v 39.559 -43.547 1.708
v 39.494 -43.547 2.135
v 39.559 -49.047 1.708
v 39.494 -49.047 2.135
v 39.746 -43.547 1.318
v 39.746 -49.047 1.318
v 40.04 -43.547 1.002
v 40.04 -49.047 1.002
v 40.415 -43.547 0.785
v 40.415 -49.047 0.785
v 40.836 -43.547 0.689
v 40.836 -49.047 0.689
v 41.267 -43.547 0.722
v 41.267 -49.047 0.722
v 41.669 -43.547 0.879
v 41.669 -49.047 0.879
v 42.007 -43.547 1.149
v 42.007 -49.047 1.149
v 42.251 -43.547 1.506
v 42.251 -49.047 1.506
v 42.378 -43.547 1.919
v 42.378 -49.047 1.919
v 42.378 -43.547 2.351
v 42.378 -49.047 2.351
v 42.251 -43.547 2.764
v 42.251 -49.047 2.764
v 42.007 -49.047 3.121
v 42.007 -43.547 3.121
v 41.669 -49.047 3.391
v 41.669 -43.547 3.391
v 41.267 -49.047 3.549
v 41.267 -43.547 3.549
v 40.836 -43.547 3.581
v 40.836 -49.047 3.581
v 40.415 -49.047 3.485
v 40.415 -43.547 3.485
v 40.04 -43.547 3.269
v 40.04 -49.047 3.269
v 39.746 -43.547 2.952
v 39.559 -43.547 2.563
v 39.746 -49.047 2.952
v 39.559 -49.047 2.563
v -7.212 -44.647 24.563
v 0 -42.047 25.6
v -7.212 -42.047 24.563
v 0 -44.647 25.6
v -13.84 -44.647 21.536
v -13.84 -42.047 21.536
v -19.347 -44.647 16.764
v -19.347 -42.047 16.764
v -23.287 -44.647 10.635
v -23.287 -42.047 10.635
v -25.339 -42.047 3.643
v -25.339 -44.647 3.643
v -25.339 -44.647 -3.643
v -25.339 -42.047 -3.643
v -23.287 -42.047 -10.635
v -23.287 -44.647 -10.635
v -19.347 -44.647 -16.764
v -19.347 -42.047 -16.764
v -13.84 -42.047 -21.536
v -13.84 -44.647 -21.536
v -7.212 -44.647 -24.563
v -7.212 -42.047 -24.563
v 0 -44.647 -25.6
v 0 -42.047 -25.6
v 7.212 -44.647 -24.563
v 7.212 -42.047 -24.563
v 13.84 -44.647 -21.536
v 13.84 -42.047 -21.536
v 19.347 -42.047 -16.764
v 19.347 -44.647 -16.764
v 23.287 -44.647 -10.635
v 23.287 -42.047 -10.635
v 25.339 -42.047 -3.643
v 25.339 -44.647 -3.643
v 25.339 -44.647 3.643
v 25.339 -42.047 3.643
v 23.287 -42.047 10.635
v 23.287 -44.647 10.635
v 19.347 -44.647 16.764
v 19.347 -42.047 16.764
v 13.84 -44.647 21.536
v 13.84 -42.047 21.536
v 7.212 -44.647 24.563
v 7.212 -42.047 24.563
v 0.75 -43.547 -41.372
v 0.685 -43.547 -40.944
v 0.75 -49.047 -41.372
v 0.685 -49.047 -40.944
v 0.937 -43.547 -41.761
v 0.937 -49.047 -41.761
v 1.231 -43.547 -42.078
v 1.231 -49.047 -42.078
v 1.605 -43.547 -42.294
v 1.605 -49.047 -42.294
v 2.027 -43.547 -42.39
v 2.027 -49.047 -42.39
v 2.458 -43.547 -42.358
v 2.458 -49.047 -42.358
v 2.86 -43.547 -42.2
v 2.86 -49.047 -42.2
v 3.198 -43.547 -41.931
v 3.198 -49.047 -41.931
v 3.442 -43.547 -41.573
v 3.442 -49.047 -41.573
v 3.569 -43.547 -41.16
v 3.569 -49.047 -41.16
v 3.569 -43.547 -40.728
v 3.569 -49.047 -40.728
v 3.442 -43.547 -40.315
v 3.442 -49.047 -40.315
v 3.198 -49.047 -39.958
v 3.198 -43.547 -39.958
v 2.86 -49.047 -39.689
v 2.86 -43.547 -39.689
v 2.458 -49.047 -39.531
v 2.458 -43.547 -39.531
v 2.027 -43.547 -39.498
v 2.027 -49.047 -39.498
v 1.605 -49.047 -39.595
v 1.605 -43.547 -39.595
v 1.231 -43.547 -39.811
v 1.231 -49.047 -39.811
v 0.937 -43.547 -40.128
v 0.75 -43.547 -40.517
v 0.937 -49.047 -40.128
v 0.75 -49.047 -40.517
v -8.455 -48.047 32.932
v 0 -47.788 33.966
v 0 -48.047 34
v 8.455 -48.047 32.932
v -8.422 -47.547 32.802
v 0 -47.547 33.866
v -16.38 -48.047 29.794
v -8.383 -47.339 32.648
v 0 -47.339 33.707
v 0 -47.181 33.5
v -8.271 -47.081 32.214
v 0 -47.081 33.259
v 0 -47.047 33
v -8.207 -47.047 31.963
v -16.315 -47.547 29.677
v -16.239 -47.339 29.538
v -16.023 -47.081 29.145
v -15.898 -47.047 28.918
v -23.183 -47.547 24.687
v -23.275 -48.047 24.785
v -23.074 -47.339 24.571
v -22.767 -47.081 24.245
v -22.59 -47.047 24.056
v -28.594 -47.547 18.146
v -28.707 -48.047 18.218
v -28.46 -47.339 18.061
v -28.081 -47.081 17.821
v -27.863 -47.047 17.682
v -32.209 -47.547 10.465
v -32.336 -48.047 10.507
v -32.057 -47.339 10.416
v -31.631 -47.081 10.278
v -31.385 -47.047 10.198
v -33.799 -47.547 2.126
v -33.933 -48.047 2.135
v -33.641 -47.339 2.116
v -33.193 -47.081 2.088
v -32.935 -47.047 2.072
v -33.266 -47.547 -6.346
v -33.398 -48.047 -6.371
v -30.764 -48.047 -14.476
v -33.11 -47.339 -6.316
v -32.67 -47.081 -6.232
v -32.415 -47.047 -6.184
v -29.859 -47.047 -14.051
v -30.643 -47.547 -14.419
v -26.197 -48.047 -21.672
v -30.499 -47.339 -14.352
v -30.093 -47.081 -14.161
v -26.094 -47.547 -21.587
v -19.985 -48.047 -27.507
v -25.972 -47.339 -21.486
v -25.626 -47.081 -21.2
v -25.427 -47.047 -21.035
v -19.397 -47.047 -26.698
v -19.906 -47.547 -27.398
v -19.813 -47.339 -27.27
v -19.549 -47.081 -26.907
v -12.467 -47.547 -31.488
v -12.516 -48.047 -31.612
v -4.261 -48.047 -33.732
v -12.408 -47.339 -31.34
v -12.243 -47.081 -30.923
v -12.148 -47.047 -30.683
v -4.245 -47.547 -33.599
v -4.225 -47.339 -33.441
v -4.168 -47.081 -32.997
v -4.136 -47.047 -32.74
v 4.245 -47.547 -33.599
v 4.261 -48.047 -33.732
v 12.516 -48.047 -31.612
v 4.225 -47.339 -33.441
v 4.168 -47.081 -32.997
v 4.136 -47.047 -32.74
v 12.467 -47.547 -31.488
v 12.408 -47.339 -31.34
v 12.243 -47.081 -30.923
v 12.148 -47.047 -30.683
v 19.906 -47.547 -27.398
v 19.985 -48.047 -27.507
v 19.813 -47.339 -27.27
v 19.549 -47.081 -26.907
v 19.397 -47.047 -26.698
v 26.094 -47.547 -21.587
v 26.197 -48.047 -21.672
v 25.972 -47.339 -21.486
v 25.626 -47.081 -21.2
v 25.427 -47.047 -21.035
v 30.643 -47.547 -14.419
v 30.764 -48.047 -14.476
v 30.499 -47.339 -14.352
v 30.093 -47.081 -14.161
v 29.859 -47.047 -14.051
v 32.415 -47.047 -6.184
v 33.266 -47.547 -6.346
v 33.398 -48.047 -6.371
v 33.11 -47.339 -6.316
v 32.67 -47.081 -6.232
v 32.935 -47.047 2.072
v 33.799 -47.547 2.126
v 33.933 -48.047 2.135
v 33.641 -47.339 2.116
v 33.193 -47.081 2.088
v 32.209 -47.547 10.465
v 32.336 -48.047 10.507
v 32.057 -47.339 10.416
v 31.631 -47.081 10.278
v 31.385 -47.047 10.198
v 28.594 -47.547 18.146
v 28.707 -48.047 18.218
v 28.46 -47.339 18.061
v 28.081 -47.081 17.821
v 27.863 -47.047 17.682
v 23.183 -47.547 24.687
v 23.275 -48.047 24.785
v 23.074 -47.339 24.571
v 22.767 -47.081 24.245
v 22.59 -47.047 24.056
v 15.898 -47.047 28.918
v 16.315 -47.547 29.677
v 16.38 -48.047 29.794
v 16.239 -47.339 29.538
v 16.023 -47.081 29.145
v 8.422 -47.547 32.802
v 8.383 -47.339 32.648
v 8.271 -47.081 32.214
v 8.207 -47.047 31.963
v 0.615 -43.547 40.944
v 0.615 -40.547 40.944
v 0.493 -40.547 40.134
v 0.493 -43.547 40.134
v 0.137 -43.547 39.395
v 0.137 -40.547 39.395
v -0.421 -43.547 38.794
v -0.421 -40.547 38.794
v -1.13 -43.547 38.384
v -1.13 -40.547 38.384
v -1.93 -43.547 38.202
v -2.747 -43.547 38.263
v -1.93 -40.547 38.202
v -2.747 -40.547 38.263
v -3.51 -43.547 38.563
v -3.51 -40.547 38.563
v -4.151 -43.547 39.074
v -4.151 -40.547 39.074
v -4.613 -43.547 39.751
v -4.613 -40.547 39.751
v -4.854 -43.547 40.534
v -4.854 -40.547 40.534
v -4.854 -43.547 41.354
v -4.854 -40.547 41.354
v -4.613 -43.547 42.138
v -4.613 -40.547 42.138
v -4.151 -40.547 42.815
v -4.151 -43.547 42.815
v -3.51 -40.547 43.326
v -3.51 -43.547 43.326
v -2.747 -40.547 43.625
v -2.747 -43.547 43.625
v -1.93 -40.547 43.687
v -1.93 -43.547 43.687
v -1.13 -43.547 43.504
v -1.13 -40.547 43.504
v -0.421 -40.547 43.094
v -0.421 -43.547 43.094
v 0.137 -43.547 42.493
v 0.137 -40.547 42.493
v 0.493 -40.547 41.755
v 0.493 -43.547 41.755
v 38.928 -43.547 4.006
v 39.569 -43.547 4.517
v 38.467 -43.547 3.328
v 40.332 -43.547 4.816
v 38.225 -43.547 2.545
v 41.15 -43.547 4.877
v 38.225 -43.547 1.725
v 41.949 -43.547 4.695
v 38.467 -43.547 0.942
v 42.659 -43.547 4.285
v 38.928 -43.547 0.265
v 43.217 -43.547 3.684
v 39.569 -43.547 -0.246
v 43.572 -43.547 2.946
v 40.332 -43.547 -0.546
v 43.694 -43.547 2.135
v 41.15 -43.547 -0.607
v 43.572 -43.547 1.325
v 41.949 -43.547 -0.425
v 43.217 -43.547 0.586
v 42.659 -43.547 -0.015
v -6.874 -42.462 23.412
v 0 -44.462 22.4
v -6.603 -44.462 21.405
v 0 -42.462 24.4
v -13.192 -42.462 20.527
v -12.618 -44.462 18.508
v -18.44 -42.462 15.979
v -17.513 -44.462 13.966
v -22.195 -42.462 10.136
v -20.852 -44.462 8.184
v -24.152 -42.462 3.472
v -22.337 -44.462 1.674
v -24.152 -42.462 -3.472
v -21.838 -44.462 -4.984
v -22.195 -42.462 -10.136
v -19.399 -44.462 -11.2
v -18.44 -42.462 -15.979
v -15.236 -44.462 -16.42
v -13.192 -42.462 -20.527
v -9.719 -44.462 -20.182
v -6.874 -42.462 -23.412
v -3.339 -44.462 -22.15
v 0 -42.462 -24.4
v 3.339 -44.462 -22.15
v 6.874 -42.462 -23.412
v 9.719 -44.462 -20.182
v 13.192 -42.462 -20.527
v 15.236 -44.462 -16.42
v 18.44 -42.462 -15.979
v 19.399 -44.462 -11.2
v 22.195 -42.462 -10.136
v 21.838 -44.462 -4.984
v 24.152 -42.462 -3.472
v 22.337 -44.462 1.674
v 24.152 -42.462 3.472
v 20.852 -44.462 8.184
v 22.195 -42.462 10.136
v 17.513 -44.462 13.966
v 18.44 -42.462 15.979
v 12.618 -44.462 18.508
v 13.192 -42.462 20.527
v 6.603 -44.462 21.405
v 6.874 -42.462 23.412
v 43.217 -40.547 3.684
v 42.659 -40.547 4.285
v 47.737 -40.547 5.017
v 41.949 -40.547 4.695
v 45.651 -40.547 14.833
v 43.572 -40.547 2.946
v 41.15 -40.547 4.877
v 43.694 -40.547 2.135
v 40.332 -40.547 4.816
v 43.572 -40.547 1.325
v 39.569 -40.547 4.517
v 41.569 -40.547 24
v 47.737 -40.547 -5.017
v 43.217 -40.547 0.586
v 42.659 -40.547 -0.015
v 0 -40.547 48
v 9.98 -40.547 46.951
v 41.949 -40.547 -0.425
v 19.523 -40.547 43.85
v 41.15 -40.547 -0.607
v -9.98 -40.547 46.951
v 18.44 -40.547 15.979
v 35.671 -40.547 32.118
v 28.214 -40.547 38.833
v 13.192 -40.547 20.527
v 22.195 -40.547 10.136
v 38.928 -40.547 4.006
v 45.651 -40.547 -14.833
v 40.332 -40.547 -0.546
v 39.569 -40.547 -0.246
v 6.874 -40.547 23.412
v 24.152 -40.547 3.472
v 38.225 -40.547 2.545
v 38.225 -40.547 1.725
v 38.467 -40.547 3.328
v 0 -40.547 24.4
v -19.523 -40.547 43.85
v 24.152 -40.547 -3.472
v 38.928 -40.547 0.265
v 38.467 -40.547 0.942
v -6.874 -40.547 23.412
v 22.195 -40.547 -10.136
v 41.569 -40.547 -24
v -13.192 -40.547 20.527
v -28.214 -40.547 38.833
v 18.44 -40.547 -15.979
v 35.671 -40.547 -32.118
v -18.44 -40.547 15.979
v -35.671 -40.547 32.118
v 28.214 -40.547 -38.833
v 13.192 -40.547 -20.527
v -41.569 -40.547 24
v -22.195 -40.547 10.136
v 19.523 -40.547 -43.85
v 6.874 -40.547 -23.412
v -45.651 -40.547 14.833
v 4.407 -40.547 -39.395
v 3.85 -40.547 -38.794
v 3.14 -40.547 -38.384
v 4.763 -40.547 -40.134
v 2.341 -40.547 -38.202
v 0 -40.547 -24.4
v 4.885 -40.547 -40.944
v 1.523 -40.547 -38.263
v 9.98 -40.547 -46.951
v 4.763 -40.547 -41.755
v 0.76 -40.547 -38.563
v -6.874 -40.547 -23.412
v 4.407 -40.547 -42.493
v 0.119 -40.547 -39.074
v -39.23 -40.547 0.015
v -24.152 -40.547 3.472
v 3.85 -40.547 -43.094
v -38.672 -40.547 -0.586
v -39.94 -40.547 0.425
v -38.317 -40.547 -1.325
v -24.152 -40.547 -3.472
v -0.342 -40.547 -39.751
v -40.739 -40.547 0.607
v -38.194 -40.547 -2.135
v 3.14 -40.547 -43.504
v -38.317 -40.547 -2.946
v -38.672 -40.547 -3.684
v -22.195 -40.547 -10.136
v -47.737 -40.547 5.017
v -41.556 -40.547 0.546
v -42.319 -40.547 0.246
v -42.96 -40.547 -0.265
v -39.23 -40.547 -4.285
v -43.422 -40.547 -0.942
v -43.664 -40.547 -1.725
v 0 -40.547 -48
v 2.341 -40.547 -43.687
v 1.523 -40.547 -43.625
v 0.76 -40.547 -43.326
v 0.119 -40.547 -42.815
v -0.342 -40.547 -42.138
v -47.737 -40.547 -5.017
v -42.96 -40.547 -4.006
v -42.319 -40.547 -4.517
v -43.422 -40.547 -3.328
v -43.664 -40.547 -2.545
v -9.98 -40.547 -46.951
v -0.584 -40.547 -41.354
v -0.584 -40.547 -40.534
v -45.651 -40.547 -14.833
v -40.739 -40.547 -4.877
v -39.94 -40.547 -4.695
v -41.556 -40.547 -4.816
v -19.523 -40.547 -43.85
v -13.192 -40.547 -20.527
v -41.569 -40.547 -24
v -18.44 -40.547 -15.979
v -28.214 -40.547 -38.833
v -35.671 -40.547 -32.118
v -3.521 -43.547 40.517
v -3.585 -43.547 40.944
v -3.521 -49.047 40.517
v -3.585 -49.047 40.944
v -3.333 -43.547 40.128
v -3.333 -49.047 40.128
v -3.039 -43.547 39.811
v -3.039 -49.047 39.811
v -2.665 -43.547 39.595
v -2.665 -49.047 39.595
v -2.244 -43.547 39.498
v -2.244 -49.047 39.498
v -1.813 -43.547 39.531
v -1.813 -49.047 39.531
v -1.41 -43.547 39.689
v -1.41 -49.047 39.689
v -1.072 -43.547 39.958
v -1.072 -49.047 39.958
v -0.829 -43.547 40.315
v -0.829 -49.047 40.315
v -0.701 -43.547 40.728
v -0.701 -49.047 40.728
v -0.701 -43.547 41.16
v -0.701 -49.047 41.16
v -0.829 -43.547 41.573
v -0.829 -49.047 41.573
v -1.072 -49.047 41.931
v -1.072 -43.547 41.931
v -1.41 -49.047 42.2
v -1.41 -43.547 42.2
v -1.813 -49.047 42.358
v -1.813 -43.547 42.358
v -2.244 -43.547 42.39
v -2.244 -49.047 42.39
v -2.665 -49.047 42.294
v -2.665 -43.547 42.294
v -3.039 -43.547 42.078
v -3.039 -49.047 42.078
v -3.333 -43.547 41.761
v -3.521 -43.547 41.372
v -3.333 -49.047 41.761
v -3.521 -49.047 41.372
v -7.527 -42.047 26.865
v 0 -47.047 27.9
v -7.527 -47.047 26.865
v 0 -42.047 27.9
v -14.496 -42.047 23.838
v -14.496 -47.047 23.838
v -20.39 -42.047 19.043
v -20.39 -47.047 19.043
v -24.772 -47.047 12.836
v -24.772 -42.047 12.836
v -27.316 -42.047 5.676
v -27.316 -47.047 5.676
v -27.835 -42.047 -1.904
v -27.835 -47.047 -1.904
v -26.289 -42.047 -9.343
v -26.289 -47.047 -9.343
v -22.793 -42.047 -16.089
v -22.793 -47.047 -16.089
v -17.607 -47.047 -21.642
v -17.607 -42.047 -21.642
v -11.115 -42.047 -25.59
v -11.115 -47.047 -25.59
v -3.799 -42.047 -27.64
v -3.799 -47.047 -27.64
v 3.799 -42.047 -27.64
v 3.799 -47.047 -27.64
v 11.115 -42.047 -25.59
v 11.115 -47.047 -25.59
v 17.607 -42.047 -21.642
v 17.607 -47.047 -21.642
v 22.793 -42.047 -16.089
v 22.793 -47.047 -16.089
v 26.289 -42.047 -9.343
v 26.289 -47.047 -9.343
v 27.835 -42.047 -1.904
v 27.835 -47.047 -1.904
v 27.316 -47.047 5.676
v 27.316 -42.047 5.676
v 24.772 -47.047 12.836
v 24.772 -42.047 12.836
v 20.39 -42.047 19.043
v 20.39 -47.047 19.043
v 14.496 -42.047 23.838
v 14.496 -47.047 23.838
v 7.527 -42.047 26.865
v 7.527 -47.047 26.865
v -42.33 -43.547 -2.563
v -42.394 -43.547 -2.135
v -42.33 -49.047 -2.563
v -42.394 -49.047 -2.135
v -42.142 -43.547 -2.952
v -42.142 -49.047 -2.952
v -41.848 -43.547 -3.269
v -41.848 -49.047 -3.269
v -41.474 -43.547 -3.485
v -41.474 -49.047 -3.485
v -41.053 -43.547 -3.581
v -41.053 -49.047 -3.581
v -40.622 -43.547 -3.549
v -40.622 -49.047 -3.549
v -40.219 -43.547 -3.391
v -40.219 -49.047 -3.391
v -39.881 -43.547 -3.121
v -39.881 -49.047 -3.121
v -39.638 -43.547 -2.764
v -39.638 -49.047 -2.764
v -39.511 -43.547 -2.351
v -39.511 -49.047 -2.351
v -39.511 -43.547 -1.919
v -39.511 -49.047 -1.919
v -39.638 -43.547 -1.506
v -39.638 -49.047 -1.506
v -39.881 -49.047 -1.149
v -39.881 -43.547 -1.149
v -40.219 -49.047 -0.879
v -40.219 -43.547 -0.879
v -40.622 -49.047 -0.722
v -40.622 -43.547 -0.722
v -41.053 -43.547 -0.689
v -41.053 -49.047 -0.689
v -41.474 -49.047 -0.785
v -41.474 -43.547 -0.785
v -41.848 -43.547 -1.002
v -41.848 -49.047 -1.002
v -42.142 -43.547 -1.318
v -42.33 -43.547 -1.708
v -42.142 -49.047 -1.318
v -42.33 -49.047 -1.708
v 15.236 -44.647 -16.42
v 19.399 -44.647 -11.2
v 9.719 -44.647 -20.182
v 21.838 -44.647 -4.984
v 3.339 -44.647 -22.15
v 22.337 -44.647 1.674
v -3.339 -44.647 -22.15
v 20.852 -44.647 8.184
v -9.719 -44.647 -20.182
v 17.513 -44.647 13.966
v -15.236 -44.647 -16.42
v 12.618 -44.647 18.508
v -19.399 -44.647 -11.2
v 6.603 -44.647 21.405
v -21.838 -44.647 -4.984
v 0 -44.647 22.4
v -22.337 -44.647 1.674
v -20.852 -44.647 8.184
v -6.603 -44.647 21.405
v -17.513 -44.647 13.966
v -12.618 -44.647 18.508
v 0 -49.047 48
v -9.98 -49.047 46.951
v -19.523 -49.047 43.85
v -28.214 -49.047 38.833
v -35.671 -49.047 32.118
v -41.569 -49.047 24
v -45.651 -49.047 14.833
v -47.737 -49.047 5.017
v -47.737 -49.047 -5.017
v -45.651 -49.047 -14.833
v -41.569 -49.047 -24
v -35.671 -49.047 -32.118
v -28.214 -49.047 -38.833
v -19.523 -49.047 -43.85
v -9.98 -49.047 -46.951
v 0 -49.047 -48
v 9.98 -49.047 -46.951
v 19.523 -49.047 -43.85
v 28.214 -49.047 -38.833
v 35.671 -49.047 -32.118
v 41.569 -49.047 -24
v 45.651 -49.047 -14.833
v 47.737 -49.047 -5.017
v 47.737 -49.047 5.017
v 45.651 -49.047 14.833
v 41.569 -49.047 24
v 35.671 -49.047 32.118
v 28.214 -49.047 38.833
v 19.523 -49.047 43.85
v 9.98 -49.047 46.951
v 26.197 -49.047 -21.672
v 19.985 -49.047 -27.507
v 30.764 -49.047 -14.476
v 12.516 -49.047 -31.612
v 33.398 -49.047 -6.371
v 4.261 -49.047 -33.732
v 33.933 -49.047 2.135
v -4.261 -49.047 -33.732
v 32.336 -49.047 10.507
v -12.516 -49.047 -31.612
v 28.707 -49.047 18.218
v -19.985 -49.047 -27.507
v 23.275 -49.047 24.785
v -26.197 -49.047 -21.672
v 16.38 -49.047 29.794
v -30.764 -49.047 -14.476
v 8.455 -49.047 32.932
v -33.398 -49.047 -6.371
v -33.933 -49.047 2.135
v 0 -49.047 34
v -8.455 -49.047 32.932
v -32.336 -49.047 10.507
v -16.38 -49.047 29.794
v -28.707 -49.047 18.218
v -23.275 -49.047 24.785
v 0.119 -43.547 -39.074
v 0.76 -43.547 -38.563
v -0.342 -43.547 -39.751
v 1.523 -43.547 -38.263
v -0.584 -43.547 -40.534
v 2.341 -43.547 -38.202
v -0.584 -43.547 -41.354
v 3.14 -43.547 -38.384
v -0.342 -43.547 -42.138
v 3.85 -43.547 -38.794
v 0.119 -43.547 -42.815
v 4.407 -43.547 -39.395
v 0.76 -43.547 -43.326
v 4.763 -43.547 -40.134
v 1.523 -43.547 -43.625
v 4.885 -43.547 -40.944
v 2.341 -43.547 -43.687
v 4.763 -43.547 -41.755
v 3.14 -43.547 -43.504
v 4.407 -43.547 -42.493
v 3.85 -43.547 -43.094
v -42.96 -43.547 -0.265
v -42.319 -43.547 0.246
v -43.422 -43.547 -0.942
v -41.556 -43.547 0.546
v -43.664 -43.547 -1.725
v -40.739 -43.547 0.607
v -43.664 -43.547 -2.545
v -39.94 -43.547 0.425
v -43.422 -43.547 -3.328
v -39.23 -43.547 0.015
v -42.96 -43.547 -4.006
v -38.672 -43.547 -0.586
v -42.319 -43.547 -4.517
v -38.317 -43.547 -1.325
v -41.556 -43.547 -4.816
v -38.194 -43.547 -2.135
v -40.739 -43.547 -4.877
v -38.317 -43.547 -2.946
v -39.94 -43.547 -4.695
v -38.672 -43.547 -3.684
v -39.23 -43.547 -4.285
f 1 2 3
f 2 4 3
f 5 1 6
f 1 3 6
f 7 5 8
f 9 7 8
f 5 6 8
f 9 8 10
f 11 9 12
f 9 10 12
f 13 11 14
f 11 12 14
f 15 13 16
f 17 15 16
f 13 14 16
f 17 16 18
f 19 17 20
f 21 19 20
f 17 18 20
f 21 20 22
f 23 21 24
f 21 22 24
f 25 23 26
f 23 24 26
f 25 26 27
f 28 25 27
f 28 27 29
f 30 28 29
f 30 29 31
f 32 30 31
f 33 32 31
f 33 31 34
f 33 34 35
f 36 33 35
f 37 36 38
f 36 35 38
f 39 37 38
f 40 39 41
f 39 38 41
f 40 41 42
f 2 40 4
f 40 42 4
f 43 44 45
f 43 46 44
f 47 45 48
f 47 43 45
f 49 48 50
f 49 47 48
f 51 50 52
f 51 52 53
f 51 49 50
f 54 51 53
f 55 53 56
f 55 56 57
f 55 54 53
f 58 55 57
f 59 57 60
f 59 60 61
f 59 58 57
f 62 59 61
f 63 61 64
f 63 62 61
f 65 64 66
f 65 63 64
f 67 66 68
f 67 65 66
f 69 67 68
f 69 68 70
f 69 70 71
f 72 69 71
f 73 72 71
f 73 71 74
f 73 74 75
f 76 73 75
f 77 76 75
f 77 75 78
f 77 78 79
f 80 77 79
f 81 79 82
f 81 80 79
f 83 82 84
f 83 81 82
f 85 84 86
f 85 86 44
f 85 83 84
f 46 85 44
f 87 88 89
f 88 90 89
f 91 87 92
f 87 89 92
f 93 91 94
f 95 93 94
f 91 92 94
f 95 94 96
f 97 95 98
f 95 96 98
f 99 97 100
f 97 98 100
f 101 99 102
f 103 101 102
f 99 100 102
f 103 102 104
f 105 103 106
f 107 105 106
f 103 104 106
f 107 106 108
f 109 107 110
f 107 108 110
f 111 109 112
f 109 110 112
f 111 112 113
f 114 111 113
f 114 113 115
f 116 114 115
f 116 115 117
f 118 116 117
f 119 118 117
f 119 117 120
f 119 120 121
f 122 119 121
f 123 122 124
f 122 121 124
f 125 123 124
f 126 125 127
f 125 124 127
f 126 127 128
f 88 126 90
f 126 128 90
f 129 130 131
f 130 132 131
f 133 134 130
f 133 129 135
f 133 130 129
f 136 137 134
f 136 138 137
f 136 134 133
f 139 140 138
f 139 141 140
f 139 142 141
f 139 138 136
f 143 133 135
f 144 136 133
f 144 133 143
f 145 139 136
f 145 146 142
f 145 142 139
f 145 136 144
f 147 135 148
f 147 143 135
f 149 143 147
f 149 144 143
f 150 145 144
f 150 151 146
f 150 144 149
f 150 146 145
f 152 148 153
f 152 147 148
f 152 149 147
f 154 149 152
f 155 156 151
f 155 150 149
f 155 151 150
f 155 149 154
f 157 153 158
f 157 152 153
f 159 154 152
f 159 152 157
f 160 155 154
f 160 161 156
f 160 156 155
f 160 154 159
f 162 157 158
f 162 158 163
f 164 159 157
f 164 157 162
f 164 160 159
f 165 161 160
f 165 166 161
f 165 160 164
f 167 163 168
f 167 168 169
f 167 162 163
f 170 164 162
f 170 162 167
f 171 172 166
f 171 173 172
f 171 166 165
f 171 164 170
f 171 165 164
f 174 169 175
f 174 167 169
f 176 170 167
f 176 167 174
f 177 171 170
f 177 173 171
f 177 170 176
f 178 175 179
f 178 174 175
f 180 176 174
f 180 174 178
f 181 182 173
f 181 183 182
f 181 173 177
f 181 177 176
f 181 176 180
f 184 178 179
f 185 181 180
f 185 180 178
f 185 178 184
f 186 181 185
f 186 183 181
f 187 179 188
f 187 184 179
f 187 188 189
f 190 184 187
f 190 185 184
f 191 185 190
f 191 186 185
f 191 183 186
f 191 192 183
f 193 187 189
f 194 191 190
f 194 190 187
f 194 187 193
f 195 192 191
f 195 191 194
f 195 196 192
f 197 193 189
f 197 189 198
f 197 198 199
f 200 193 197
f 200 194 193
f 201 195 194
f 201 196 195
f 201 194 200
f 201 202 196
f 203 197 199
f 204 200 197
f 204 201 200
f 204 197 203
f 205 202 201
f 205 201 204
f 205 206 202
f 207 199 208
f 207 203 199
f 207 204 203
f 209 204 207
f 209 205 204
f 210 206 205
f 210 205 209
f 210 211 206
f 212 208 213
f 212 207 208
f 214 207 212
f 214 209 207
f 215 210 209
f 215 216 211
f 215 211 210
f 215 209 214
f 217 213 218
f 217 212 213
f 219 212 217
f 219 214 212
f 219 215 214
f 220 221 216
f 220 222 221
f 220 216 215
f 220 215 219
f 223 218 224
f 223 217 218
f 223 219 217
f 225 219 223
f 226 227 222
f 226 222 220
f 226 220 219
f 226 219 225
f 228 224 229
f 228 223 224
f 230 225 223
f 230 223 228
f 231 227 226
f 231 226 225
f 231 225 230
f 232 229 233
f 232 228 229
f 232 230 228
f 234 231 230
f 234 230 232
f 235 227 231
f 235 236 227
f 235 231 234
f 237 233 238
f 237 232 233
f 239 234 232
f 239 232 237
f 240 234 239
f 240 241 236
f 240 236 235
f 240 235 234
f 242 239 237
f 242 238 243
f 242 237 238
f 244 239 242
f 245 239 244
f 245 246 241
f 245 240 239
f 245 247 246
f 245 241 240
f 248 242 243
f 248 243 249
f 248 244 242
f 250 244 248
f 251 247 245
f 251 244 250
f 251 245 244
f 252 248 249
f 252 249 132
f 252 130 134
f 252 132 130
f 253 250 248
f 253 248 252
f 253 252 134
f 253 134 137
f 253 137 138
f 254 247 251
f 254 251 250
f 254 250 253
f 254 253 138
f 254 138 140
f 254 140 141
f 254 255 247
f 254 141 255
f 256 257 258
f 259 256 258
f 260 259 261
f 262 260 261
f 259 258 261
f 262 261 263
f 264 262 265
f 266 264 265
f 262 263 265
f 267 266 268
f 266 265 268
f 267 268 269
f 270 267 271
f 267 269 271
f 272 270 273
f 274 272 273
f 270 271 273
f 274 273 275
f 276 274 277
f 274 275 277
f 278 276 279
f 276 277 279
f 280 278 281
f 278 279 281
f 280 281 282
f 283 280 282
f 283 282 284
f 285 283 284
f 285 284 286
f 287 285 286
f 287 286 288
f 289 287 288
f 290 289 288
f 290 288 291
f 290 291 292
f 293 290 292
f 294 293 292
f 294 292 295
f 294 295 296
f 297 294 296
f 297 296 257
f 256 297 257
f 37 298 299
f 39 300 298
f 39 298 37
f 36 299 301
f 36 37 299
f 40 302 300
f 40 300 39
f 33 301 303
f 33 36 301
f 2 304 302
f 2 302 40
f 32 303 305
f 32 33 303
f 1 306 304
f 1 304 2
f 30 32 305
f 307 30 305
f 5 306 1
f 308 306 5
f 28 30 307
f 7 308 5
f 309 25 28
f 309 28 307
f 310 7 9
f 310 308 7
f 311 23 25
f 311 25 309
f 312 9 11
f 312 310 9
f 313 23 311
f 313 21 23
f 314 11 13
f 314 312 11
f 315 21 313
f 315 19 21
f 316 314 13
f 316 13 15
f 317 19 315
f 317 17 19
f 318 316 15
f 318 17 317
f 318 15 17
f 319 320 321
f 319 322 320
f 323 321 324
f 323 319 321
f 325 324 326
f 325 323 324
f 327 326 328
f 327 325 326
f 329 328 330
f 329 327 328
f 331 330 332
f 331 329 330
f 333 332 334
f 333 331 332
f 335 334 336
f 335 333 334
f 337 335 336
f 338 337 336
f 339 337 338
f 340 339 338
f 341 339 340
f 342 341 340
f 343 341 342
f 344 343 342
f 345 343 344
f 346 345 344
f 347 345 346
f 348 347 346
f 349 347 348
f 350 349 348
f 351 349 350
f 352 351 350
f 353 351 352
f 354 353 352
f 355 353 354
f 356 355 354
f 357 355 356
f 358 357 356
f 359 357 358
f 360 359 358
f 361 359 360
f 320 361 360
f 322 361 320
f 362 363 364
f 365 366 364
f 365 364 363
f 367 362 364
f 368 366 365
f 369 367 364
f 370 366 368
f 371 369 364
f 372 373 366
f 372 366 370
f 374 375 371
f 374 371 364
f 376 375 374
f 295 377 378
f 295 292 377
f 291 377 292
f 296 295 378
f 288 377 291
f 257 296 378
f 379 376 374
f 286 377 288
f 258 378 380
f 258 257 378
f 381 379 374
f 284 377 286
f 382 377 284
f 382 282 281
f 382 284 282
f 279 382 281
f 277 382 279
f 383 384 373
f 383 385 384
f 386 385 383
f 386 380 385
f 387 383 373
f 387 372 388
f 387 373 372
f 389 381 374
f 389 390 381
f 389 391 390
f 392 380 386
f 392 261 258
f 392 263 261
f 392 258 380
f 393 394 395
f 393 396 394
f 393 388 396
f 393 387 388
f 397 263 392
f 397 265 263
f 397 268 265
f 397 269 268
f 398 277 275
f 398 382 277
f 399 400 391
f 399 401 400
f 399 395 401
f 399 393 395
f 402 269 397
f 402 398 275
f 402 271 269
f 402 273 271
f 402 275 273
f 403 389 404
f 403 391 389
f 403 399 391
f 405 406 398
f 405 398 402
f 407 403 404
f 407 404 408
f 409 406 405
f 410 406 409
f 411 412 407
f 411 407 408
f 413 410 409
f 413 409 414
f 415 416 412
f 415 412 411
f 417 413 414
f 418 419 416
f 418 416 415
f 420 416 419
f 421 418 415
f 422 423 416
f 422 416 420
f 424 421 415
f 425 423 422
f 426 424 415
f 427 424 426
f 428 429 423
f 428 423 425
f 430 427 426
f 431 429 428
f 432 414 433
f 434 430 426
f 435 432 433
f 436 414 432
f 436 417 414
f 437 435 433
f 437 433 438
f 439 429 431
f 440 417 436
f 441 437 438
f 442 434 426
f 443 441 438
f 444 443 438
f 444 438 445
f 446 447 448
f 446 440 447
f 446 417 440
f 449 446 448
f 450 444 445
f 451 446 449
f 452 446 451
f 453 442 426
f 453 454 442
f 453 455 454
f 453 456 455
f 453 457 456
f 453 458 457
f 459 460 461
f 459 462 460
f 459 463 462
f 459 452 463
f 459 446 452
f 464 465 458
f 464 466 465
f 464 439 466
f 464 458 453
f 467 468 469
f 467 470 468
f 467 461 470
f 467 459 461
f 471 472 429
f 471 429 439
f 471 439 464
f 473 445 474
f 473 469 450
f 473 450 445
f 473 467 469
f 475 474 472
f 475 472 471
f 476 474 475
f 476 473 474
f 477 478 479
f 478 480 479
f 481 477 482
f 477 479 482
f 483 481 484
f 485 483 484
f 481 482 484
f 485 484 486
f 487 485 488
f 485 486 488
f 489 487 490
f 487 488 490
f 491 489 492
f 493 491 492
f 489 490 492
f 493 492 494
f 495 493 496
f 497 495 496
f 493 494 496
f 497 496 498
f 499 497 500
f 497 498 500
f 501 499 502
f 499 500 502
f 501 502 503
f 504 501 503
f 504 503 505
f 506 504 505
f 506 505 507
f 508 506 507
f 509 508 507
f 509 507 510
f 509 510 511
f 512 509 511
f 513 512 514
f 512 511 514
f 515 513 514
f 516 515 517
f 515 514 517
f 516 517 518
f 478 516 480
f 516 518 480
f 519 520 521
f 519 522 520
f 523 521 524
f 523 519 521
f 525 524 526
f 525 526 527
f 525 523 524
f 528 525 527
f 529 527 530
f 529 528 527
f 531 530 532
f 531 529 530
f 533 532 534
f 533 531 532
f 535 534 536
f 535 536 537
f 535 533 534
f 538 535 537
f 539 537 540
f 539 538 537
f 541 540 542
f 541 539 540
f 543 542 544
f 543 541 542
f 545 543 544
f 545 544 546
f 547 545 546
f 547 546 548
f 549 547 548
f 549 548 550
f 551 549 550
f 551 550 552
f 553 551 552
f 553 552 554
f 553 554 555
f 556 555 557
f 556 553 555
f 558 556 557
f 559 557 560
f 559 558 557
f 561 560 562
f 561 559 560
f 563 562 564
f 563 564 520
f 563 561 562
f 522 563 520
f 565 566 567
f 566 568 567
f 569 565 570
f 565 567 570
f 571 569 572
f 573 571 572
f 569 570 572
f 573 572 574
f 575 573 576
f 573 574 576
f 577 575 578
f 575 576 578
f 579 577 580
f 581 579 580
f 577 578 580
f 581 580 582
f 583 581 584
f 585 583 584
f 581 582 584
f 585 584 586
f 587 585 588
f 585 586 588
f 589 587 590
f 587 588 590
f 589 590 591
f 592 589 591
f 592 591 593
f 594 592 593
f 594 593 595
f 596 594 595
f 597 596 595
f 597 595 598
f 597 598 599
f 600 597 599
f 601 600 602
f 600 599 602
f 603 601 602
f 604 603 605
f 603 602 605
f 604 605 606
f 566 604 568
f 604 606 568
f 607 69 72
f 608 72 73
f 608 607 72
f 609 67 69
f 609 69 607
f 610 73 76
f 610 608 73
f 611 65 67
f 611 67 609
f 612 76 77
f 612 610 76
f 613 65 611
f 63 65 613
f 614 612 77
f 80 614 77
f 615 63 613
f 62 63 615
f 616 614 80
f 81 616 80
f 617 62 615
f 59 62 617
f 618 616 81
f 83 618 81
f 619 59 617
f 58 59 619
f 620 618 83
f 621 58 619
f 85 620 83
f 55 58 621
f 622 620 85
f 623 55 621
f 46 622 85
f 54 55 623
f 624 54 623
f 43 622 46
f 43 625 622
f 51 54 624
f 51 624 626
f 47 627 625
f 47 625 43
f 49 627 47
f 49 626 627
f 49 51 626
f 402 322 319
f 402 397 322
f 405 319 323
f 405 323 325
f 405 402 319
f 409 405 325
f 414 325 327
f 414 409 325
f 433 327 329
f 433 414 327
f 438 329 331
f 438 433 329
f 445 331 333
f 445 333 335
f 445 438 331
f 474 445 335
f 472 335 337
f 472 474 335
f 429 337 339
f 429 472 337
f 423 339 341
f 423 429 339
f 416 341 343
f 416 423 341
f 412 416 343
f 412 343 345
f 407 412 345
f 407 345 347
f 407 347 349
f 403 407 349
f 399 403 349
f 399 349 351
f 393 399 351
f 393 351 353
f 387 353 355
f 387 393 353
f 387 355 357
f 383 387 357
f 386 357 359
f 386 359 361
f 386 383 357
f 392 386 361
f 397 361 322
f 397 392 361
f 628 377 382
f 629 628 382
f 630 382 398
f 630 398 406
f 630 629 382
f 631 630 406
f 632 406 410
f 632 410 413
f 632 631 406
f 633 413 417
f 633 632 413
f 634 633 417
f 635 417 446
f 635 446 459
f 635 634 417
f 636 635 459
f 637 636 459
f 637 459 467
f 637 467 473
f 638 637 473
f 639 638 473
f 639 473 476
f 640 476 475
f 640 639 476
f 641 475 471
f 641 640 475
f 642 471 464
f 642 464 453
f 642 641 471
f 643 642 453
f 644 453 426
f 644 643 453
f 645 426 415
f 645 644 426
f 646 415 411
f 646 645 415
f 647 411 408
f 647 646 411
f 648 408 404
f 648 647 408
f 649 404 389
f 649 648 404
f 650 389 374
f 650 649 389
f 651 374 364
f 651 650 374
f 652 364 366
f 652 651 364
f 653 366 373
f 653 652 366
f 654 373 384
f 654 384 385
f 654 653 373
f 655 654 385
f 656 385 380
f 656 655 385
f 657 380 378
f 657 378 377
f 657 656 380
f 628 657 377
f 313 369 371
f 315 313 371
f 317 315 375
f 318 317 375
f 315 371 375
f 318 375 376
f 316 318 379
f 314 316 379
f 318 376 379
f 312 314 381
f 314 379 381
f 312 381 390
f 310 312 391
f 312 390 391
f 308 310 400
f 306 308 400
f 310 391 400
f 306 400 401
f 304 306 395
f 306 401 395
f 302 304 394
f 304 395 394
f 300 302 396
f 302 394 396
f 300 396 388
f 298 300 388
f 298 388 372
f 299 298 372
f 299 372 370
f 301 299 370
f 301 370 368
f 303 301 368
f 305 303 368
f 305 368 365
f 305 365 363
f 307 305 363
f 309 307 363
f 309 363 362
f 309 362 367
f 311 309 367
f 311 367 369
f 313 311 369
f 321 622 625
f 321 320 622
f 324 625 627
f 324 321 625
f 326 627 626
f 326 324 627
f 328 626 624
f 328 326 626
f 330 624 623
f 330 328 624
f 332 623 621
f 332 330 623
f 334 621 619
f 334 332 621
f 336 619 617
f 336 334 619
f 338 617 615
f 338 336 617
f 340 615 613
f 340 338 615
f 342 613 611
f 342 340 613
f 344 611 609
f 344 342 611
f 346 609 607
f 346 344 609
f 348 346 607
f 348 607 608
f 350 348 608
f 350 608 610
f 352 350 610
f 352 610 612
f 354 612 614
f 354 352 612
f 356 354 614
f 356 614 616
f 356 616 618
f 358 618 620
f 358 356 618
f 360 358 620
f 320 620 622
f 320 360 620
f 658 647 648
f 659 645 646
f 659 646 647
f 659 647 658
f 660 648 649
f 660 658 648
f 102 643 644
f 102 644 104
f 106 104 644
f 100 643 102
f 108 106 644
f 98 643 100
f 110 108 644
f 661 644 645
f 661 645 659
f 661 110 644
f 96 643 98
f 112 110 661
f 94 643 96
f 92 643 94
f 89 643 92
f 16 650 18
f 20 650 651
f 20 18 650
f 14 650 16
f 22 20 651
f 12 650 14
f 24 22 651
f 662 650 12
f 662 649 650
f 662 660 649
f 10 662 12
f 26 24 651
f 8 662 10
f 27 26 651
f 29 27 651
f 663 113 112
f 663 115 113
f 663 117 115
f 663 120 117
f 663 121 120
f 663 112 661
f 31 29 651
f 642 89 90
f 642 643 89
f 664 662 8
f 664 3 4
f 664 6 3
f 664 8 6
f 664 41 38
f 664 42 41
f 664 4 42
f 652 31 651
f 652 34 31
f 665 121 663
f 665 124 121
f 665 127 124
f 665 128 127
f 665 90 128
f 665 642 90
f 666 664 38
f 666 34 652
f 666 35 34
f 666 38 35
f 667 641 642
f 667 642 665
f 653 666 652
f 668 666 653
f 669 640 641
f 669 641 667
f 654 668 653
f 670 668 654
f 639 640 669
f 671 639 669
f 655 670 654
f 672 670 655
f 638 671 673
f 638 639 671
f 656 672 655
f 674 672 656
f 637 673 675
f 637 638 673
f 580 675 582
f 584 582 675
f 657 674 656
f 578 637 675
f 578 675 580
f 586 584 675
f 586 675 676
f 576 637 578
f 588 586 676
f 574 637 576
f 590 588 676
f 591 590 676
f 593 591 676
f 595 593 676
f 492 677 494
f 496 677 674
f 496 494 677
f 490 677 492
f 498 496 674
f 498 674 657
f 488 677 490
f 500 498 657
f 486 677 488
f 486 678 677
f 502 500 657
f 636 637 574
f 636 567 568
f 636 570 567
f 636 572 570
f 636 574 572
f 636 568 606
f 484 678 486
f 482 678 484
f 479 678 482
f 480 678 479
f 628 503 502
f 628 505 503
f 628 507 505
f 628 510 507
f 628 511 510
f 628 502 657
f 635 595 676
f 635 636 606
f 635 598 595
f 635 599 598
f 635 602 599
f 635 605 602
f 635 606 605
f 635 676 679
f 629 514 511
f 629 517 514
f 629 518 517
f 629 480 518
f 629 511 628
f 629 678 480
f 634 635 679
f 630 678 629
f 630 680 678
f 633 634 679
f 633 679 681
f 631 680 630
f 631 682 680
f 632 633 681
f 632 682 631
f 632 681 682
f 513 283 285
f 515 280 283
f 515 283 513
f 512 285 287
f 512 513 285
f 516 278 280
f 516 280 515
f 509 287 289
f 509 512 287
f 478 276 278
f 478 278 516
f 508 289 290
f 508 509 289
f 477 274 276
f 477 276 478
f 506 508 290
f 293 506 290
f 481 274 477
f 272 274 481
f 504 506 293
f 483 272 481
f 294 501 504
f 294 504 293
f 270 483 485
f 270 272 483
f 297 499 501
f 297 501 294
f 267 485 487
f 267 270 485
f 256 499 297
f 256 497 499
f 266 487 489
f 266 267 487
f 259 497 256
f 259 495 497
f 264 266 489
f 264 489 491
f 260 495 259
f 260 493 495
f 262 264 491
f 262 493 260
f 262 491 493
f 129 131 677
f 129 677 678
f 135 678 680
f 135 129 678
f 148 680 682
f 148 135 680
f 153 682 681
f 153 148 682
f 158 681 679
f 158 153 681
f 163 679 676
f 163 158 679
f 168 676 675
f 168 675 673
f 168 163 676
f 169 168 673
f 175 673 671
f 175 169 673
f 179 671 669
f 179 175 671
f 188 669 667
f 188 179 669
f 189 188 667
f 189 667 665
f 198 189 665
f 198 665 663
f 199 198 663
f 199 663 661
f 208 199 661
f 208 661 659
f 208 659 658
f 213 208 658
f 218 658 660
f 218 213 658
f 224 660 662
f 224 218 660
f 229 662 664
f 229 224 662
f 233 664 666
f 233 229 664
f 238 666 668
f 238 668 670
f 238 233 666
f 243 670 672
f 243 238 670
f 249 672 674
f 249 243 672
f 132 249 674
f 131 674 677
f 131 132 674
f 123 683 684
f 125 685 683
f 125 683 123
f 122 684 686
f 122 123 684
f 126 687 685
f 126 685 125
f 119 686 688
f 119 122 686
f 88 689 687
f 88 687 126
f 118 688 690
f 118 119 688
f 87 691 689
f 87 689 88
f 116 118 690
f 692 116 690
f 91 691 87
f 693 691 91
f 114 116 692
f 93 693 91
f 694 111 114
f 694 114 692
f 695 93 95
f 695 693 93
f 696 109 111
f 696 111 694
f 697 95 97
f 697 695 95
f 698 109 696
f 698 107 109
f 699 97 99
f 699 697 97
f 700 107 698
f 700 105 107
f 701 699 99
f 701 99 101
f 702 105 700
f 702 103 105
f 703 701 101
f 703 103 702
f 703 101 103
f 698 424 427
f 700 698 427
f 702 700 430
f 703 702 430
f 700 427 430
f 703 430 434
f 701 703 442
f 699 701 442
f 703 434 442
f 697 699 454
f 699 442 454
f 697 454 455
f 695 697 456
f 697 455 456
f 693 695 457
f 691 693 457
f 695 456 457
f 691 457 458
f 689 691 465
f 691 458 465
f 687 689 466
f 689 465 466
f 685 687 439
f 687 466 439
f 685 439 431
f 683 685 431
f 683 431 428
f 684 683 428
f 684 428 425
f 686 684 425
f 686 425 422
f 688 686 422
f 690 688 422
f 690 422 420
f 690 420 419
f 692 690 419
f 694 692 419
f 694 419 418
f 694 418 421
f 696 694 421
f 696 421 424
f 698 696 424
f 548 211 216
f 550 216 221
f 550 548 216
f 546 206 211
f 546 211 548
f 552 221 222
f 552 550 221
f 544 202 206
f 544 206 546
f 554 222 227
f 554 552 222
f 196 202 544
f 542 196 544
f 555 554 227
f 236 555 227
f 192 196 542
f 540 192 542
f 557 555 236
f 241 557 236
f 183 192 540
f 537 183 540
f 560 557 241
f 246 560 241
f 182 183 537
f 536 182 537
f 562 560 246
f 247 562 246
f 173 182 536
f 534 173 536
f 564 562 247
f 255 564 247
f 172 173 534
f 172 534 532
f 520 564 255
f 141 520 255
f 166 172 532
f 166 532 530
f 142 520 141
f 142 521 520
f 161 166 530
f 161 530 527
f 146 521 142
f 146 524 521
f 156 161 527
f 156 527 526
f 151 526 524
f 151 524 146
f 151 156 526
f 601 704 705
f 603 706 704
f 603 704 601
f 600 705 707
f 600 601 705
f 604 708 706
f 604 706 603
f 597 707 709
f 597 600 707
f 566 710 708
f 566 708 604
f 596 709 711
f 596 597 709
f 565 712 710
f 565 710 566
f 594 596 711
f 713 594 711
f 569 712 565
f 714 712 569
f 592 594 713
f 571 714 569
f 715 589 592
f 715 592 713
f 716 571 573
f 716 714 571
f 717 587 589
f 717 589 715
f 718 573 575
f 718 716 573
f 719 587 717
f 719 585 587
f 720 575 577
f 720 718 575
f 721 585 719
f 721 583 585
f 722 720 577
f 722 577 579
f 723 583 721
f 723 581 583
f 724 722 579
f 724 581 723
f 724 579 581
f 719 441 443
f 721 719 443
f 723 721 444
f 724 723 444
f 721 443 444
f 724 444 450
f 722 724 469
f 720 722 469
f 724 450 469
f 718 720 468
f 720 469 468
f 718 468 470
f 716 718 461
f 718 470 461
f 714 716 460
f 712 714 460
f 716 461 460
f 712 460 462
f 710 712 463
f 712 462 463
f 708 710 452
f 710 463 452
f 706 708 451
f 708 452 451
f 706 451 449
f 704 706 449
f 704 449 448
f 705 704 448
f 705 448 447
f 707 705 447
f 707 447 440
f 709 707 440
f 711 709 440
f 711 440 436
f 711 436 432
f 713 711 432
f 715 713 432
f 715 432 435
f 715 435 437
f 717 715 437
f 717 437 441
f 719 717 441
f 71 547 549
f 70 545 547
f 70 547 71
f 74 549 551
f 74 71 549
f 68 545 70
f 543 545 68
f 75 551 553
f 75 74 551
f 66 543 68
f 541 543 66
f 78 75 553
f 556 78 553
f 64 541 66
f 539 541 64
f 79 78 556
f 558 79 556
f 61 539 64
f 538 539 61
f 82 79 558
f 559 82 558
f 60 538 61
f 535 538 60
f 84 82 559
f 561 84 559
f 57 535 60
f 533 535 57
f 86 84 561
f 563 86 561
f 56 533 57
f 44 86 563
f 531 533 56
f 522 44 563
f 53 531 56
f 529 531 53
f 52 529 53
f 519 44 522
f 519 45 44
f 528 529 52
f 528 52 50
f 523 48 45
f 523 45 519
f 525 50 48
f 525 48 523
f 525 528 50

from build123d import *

# Parameters (mm, degrees)
FILLET1_R                        = 1
CBORE_FOR_M2_5_SHCS1_D           = 2.9
CBORE_FOR_M2_5_SHCS1_DEPTH       = 10
CBORE_FOR_M2_5_SHCS1_CBORE_D     = 5.5
CBORE_FOR_M2_5_SHCS1_CBORE_DEPTH = 3
CBORE_FOR_M2_5_SHCS1_TIP         = 0.871247898


with BuildPart() as part:
    # Sketch2 → Revolve1 (revolve)
    with BuildSketch(Plane(origin=(0, -49.046586852, 0), x_dir=(0.998643062566617, 0, 0.052077188744861835), z_dir=(-0.052077188744861835, 0, 0.998643062566617)), mode=Mode.PRIVATE) as revolve1_sk:
        Polygon((-25.6, 4.4), (-22.4, 4.4), (-22.4, 4.584314575), (-24.4, 6.584314575), (-24.4, 8.5), (-48, 8.5), (-48, 0), (-34, 0), (-34, 2), (-27.9, 2), (-27.9, 7), (-25.6, 7), align=None)
    revolve(revolve1_sk.sketch.rotate(Axis((0, -35.16651105, 0), (0, -1, 0)), 267.014846532), axis=Axis((0, -35.16651105, 0), (0, -1, 0)))

    # Fillet1
    fillet1_edges = [part.edges().sort_by_distance(p)[0] for p in [
        (0, -47.046586852, -34),
    ]]
    fillet(fillet1_edges, radius=FILLET1_R)

    # CBORE for M2.5 SHCS1
    with Locations(Plane(origin=(0, -40.546586852, 0), x_dir=(1, 0, 0), z_dir=(0, 1, 0))):
        with Locations((2.135164739, 40.944365565), (40.944365565, -2.135164739), (-40.944365565, 2.135164739), (-2.135164739, -40.944365565)):
            CounterBoreHole(CBORE_FOR_M2_5_SHCS1_D / 2, CBORE_FOR_M2_5_SHCS1_CBORE_D / 2, CBORE_FOR_M2_5_SHCS1_CBORE_DEPTH, depth=CBORE_FOR_M2_5_SHCS1_DEPTH)
            with Locations((0, 0, -(CBORE_FOR_M2_5_SHCS1_DEPTH + CBORE_FOR_M2_5_SHCS1_TIP / 2))):  # 118° drill point
                Cone(0, CBORE_FOR_M2_5_SHCS1_D / 2, CBORE_FOR_M2_5_SHCS1_TIP, mode=Mode.SUBTRACT)


solid = part.part
